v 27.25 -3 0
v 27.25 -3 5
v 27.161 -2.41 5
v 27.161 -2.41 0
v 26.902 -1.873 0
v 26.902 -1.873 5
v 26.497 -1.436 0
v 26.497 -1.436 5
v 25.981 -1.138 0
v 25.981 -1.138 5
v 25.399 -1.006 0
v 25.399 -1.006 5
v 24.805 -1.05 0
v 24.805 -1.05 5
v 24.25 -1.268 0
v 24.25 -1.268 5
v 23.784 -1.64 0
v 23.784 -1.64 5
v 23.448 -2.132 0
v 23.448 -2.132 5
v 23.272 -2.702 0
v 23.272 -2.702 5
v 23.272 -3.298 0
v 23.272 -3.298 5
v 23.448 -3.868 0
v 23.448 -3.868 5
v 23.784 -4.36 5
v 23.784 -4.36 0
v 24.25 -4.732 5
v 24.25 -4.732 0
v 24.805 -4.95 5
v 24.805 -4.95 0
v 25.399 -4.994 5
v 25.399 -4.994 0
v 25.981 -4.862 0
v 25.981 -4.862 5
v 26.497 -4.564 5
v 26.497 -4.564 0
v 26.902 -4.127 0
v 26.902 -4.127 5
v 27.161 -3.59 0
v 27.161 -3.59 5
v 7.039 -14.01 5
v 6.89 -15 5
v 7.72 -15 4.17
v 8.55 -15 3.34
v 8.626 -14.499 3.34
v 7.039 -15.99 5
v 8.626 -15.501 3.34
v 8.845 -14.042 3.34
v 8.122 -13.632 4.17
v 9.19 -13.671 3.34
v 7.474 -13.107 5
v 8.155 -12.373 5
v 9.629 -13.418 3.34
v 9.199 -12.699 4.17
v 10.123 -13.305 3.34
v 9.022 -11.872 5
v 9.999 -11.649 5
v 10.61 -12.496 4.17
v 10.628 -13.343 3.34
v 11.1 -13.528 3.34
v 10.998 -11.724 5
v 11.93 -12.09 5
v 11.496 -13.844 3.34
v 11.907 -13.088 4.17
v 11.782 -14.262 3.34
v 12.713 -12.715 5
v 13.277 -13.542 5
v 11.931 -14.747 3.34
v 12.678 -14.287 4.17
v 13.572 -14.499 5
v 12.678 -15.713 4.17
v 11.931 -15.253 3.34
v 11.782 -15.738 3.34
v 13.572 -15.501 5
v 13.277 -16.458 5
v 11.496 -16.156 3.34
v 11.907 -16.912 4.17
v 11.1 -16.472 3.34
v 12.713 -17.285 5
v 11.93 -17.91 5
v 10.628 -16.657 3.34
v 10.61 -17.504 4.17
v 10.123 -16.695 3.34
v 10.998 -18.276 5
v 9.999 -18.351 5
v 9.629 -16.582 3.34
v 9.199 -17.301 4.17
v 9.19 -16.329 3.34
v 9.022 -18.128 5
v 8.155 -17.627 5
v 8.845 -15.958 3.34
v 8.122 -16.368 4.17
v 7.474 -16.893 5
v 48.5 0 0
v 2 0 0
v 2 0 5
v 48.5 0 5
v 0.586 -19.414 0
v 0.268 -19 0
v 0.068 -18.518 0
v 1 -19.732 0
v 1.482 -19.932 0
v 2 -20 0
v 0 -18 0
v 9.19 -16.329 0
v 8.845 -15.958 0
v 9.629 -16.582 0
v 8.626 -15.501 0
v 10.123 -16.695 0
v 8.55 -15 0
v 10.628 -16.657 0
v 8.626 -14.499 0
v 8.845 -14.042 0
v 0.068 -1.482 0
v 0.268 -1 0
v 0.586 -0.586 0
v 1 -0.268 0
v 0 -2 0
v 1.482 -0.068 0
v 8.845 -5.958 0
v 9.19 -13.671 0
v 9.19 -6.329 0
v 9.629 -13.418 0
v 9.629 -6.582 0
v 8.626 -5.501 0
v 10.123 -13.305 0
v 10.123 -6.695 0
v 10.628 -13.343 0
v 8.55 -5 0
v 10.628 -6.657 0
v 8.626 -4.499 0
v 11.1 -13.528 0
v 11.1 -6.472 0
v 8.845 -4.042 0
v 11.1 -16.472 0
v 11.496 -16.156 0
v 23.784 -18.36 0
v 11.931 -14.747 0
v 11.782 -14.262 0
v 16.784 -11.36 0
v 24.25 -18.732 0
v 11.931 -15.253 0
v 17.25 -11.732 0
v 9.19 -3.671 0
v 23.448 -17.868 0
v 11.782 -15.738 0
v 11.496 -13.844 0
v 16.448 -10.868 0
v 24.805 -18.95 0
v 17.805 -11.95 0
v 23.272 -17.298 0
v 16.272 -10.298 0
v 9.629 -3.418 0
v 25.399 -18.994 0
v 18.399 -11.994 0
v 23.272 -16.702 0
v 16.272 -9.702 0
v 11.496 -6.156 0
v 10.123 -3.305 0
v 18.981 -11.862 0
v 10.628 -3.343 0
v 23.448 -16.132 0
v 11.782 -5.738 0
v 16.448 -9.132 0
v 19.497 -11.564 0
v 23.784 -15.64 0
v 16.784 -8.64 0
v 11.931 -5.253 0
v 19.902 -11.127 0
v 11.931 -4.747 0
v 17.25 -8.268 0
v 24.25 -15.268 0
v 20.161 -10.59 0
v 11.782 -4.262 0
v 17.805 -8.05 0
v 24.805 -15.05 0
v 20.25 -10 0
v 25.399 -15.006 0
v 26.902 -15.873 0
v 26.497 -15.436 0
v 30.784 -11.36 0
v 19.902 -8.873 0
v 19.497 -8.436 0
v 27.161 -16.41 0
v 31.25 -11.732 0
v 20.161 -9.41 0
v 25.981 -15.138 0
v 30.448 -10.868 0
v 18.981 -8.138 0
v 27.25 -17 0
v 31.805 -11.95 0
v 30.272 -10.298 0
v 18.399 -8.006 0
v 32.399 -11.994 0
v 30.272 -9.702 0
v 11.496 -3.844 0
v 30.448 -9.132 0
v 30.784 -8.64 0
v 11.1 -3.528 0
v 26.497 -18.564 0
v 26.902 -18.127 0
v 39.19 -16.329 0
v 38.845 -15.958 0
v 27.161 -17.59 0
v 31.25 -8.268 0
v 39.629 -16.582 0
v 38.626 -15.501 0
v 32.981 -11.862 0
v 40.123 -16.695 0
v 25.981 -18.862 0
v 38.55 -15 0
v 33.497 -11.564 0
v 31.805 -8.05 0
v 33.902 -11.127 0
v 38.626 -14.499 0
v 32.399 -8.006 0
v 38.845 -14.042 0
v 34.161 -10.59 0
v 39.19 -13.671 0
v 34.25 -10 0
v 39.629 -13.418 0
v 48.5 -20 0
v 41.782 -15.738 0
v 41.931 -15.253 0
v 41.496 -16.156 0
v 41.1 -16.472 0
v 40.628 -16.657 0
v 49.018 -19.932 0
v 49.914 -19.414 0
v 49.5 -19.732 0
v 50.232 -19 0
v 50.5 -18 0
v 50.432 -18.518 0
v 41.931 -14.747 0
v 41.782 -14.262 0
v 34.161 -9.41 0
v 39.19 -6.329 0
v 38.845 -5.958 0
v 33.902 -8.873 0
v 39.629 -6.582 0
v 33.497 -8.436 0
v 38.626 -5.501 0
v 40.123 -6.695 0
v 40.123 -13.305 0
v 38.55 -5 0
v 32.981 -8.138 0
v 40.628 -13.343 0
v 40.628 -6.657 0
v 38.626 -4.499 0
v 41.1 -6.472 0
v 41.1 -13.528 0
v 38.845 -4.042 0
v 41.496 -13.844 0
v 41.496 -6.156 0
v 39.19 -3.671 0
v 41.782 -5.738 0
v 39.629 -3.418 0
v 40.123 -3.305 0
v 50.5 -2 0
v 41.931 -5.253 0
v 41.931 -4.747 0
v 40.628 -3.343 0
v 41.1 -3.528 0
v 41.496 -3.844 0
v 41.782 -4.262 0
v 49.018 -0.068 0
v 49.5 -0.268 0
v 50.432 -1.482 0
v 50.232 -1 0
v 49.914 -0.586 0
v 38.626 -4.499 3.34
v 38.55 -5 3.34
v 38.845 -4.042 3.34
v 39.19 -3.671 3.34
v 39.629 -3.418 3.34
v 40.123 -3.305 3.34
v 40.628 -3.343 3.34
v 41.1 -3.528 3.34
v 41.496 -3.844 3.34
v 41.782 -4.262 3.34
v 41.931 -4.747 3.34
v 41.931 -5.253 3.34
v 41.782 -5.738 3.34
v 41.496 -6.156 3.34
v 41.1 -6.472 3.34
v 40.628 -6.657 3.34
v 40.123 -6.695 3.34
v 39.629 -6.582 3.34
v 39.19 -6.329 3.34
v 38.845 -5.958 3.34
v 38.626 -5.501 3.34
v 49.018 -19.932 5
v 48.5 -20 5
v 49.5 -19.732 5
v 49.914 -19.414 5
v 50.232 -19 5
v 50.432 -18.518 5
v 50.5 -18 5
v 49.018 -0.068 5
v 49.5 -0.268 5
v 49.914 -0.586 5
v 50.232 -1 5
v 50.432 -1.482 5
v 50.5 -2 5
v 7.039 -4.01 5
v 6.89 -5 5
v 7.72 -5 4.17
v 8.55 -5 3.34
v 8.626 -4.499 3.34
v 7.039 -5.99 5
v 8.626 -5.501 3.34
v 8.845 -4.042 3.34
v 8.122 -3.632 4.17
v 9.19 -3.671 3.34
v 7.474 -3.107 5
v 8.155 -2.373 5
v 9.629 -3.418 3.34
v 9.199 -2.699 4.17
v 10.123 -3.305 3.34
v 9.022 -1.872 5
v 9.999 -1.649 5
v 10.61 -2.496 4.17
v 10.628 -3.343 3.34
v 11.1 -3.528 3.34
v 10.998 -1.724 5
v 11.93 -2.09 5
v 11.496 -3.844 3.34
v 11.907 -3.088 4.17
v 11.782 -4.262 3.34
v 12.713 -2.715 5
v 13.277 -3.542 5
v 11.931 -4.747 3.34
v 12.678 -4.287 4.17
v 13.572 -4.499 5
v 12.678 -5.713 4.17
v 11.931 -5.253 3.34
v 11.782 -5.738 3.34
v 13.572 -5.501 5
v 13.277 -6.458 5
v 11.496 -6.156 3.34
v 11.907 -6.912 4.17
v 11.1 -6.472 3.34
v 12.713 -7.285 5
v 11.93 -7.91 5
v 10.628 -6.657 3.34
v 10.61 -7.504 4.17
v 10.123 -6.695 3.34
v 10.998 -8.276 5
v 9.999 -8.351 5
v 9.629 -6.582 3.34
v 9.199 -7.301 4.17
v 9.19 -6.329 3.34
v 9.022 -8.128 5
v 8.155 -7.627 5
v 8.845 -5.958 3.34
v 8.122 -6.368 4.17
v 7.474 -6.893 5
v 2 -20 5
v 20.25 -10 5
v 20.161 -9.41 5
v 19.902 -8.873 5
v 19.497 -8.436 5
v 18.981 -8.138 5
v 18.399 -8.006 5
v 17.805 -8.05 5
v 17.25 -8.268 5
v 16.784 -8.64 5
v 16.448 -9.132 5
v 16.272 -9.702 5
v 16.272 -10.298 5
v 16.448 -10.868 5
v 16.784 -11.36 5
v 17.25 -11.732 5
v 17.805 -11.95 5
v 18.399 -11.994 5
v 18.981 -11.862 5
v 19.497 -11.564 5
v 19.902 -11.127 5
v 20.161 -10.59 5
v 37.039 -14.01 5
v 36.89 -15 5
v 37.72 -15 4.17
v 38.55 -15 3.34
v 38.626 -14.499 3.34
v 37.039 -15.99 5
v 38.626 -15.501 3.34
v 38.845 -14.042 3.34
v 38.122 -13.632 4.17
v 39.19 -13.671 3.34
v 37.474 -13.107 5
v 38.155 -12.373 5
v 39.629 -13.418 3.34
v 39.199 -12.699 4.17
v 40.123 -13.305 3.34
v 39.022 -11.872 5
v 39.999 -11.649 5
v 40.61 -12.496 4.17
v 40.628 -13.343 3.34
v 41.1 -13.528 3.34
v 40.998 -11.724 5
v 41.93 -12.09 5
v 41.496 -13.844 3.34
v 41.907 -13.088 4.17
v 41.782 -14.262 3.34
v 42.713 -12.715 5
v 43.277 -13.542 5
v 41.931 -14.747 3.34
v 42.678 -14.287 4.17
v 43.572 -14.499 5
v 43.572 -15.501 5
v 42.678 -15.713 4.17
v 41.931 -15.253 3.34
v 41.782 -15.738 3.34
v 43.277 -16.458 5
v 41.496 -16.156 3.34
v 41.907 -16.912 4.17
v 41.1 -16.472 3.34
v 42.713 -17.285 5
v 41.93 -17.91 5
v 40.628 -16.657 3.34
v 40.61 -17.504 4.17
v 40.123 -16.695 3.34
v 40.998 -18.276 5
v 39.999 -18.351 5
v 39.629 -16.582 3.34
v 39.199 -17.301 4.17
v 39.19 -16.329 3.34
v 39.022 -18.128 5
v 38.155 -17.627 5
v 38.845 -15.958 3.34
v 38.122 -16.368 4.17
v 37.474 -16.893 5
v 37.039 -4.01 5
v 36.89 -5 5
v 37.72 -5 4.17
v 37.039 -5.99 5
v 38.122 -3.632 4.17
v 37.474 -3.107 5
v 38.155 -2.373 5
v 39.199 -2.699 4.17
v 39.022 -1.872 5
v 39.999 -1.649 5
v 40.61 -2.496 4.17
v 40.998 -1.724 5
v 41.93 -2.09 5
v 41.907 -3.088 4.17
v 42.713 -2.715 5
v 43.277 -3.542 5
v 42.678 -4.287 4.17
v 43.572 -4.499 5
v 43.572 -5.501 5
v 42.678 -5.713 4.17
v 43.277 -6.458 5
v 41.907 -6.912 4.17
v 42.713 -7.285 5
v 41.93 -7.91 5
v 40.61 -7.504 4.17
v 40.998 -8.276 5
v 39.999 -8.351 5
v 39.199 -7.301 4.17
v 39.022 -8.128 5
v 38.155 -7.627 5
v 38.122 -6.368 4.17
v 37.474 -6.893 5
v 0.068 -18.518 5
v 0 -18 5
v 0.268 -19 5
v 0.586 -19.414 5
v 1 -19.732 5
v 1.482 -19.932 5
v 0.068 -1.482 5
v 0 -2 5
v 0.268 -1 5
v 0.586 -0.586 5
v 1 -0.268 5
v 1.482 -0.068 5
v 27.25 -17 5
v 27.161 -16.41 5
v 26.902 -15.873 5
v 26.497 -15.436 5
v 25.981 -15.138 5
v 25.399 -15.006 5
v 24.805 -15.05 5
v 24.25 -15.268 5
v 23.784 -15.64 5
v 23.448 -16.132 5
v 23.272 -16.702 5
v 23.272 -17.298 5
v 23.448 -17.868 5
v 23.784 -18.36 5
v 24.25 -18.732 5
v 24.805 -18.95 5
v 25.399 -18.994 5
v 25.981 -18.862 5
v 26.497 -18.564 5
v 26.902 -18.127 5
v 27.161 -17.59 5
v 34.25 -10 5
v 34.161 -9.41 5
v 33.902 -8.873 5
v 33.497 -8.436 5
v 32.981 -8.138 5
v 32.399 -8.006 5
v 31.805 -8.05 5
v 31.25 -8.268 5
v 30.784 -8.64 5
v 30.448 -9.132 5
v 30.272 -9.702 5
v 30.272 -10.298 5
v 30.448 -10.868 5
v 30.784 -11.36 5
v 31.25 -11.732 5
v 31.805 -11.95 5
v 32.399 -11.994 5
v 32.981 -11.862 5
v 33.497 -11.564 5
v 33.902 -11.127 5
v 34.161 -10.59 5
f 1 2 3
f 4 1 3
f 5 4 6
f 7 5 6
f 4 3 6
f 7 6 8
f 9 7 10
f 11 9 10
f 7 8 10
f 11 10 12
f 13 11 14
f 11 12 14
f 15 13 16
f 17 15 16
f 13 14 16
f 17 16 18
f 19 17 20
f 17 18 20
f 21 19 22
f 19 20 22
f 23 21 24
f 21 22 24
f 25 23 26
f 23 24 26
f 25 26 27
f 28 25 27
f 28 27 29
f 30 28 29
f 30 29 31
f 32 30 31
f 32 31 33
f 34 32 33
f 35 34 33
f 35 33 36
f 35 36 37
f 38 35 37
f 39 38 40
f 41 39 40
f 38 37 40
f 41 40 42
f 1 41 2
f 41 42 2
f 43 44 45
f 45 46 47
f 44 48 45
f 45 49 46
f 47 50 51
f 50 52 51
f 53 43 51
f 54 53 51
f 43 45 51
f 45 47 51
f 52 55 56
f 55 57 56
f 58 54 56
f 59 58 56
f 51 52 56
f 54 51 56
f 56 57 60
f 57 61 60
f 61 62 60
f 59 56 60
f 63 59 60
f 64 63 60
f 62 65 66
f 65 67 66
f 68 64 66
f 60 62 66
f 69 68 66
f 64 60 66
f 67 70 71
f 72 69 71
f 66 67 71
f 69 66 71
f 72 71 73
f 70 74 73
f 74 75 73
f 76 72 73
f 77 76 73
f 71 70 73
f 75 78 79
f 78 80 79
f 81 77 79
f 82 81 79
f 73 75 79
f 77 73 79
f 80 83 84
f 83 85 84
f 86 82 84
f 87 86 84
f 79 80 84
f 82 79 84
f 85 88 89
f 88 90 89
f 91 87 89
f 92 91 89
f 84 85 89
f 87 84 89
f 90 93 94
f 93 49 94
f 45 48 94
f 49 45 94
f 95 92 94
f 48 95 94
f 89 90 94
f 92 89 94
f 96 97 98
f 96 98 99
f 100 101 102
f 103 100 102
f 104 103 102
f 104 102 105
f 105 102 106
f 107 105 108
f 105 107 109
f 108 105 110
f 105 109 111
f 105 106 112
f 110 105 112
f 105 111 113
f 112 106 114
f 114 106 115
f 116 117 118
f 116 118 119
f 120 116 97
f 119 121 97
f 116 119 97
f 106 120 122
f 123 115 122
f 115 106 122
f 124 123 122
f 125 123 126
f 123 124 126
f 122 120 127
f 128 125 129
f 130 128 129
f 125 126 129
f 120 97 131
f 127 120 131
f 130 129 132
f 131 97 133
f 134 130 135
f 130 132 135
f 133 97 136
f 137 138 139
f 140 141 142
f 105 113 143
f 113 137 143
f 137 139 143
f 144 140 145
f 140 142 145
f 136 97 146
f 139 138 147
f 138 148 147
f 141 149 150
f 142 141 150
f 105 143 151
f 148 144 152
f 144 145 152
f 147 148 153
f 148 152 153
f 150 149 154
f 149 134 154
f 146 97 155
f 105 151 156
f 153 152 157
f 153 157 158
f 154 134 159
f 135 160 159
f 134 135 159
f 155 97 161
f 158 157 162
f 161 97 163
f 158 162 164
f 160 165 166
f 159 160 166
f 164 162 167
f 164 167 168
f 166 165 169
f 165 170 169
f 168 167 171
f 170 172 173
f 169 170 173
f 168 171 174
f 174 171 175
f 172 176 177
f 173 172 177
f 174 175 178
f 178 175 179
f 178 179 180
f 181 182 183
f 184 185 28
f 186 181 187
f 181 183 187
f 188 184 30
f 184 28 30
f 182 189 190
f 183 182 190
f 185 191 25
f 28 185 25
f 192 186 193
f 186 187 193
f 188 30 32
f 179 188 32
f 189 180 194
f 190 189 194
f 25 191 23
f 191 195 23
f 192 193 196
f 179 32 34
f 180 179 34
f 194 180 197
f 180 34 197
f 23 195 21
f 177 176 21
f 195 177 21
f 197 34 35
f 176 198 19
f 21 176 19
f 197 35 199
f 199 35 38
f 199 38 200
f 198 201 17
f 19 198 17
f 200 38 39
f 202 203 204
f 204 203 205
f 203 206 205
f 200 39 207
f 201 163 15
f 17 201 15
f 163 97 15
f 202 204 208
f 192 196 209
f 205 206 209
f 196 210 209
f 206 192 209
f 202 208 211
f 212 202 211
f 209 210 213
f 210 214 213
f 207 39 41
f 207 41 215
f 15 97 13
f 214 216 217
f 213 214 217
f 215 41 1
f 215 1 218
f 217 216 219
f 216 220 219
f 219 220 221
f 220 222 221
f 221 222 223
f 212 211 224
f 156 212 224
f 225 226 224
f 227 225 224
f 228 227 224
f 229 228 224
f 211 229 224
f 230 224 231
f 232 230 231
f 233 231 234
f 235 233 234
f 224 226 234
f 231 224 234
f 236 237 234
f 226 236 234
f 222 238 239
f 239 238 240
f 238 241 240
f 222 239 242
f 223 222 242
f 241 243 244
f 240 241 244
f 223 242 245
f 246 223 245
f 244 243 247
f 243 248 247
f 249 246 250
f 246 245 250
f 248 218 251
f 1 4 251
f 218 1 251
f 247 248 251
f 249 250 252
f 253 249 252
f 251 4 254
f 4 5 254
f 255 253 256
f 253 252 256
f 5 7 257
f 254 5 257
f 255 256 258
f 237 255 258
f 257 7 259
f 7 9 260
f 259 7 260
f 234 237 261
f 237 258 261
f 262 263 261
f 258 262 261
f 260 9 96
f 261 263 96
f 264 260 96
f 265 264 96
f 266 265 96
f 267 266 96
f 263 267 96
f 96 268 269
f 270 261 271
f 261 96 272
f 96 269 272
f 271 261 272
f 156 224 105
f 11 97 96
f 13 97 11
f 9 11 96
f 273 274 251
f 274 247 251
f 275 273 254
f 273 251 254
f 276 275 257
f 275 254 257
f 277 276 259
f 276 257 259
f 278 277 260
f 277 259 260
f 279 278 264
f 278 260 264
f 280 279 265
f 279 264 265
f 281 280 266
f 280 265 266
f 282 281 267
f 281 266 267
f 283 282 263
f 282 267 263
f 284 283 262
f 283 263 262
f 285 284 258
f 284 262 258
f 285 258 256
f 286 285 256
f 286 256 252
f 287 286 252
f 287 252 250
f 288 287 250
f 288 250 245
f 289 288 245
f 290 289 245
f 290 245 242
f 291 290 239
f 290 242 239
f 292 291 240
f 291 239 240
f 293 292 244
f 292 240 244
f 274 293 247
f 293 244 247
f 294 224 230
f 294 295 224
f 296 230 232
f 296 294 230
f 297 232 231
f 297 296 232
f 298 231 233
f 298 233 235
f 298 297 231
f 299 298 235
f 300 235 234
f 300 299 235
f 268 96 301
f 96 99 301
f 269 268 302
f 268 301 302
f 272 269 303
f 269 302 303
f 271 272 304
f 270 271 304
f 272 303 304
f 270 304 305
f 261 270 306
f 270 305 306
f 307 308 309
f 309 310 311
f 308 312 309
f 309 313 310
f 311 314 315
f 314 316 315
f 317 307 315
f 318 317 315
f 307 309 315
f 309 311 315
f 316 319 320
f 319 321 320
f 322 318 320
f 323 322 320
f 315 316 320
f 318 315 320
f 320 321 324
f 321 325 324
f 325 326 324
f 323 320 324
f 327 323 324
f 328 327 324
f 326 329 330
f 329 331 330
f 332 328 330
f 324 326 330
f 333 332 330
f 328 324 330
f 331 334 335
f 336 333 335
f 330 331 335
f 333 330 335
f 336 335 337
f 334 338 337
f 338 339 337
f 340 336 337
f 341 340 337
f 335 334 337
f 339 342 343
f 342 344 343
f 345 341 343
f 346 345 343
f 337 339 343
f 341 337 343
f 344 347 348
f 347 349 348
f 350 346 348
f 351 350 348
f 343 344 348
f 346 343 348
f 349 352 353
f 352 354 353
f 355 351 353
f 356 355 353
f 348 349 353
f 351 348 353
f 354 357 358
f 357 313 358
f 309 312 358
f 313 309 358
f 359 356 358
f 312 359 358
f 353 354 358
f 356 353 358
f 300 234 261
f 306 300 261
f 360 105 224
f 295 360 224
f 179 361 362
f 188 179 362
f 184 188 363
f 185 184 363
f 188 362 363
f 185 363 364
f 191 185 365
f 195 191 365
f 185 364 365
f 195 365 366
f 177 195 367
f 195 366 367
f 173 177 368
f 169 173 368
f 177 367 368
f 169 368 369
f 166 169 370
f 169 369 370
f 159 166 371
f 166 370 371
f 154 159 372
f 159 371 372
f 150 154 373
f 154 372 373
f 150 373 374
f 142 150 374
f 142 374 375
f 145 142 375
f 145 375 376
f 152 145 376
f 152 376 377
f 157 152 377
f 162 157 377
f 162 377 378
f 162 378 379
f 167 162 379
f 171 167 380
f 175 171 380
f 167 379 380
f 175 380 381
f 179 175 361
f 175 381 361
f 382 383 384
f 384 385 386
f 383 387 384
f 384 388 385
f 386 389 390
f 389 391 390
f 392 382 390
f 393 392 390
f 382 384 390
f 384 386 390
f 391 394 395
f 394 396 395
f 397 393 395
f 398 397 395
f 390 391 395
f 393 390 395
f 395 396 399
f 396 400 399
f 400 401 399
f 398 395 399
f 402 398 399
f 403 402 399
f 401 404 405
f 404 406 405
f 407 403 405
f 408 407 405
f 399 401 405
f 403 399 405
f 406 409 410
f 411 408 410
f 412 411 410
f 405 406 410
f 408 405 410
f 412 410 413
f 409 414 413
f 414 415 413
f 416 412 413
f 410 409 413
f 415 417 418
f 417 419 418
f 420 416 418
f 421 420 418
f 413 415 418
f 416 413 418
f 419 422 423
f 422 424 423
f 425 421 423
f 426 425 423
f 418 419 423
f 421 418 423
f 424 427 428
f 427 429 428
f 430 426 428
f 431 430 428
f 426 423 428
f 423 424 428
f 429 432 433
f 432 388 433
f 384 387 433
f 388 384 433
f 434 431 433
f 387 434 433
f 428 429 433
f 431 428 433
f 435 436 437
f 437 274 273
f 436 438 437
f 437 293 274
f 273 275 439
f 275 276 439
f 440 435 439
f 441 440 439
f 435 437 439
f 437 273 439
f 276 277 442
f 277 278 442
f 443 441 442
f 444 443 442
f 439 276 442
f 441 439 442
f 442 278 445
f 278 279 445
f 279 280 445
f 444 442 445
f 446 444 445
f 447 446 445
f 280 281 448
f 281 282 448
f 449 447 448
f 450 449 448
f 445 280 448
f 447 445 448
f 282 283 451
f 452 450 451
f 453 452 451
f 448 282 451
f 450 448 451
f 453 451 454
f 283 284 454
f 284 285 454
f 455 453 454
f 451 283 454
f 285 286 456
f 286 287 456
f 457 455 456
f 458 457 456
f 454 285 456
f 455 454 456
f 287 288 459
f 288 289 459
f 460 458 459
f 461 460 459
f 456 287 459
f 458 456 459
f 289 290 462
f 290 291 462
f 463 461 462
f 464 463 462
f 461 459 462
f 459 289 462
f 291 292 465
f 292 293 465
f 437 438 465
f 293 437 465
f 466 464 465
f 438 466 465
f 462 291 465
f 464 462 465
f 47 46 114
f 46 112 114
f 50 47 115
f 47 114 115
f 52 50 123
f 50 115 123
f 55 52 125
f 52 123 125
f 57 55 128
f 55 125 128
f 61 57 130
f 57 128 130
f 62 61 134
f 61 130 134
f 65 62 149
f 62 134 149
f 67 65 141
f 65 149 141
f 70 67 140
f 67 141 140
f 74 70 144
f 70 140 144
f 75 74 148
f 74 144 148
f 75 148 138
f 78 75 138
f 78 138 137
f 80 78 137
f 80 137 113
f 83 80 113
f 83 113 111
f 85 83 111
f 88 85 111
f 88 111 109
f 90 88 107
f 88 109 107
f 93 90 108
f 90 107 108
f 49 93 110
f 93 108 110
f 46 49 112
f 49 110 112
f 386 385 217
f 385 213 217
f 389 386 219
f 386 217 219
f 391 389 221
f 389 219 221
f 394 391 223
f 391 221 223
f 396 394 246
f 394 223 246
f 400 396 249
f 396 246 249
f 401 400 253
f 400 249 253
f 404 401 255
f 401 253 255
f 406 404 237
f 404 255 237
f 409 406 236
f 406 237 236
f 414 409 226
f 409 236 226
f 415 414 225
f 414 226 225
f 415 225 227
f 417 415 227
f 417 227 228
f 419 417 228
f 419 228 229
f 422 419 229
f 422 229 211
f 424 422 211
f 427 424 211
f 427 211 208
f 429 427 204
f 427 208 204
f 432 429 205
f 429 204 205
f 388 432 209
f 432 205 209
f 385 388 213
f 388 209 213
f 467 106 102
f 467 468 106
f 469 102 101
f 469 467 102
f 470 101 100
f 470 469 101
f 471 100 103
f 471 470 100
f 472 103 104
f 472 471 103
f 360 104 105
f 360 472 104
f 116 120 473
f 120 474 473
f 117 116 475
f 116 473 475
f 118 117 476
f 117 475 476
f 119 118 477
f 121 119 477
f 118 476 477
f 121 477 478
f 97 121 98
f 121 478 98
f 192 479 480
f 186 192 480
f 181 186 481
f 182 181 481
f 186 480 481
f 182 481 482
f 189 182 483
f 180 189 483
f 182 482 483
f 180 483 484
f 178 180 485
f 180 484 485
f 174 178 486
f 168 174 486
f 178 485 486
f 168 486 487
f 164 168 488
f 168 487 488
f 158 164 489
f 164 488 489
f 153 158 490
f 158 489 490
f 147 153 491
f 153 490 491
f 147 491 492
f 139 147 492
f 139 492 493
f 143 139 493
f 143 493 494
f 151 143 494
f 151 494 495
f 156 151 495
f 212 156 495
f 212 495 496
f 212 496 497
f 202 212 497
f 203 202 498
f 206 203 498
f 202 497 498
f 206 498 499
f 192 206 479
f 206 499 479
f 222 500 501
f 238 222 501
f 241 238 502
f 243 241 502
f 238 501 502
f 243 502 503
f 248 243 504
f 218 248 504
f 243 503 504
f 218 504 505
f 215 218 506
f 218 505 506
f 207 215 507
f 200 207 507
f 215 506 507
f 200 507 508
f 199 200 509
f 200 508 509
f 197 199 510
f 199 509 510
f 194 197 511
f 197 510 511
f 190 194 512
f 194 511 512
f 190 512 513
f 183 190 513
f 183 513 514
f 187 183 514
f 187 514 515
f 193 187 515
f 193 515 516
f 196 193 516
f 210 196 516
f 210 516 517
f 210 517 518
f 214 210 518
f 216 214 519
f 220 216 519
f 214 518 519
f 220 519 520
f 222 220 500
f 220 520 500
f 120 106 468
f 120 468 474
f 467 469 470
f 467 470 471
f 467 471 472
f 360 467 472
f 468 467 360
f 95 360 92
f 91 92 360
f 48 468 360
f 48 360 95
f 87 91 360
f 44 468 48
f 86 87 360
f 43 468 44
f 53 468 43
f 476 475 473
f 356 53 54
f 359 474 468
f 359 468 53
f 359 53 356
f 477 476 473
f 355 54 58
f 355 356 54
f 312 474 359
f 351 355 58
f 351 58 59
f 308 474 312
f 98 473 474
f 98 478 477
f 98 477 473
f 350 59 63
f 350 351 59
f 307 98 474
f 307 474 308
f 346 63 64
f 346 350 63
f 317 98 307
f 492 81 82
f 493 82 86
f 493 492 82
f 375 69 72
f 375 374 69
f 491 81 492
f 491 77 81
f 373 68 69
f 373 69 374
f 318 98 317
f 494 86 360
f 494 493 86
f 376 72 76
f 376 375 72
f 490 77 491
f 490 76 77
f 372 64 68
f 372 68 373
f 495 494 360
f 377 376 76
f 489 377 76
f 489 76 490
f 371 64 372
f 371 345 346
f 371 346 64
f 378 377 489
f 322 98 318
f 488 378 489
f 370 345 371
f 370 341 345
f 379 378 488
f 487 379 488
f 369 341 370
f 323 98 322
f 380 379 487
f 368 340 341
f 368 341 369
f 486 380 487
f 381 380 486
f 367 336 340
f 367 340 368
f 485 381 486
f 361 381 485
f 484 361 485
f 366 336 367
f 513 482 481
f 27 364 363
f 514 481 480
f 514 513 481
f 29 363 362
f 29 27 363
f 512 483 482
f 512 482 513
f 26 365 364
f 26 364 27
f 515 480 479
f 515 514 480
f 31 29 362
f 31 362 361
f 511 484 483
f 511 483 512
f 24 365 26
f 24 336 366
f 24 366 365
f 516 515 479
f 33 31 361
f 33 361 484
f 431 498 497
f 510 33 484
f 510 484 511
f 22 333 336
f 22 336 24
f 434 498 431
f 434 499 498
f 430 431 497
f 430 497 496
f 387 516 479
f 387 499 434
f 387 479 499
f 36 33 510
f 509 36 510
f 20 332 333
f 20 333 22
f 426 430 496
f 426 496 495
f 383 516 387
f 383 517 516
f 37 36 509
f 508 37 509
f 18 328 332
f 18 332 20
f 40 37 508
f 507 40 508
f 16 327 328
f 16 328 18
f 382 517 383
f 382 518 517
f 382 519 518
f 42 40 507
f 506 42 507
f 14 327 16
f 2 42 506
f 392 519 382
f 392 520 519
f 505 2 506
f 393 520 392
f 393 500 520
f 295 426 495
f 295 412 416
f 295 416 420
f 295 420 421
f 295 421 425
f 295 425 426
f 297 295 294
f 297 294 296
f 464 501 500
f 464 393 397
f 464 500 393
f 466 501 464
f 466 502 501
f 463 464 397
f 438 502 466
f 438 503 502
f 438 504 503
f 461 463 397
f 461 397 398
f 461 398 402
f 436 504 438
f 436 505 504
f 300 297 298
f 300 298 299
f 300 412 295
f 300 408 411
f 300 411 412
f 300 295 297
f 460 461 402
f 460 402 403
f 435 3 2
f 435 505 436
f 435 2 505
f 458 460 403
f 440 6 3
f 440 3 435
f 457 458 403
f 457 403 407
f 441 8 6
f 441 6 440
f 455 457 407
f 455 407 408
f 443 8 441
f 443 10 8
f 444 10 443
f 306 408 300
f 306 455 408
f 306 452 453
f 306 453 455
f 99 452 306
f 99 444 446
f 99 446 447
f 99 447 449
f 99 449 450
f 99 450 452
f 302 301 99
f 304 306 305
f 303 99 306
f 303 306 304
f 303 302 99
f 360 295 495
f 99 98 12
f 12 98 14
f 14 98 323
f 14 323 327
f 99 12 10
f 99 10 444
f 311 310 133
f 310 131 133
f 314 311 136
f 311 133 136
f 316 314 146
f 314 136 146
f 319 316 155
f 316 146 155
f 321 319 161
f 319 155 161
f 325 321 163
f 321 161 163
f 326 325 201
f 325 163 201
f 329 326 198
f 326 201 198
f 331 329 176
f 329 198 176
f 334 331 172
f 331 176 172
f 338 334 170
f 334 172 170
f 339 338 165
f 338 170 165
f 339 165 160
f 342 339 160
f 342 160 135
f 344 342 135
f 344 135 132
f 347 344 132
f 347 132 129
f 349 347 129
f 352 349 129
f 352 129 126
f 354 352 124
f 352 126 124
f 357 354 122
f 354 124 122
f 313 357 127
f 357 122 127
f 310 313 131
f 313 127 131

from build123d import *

# Parameters (mm, degrees)
SKETCH_1_W                   = 50.5
SKETCH_1_H                   = 20
EXTRUDE_1_DEPTH              = 5
SKETCH_2_R                   = 1.6
CUT_EXTRUDE_1_DEPTH          = 5
HOLE_WIZARD_M3_1_D           = 3.4
HOLE_WIZARD_M3_1_CSINK_D     = 6.72
HOLE_WIZARD_M3_1_CSINK_ANGLE = 90
SKETCH_6_R                   = 2
CUT_EXTRUDE_2_DEPTH          = 5
FILLET_1_R                   = 2


with BuildPart() as part:
    # 草图1 → 凸台-拉伸1 (new body)
    with BuildSketch(Plane.XY):
        with Locations((25.25, -10)):
            Rectangle(SKETCH_1_W, SKETCH_1_H)
    extrude(amount=EXTRUDE_1_DEPTH)

    # 草图2 → 切除-拉伸1 (cut)
    with BuildSketch(Plane(origin=(0, 0, 0), x_dir=(-1, 0, 0), z_dir=(0, 0, -1))):
        with Locations((-40.25, -5)):
            Circle(SKETCH_2_R)
        with Locations((-40.25, -15)):
            Circle(SKETCH_2_R)
        with Locations((-10.25, -5)):
            Circle(SKETCH_2_R)
        with Locations((-10.25, -15)):
            Circle(SKETCH_2_R)
    extrude(amount=-CUT_EXTRUDE_1_DEPTH, mode=Mode.SUBTRACT)

    # M3 六角凹锥坑螺钉的锥形沉头孔1 (through all)
    with Locations(Plane.XY.offset(5)):
        with Locations((10.25, -5), (10.25, -15), (40.25, -5), (40.25, -15)):
            CounterSinkHole(HOLE_WIZARD_M3_1_D / 2, HOLE_WIZARD_M3_1_CSINK_D / 2, counter_sink_angle=HOLE_WIZARD_M3_1_CSINK_ANGLE)

    # 草图6 → 切除-拉伸2 (cut)
    with BuildSketch(Plane.XY.offset(5)):
        with Locations((25.25, -3)):
            Circle(SKETCH_6_R)
        with Locations((32.25, -10)):
            Circle(SKETCH_6_R)
        with Locations((18.25, -10)):
            Circle(SKETCH_6_R)
        with Locations((25.25, -17)):
            Circle(SKETCH_6_R)
    extrude(amount=-CUT_EXTRUDE_2_DEPTH, mode=Mode.SUBTRACT)

    # 圆角1
    fillet_1_edges = [part.edges().sort_by_distance(p)[0] for p in [
        (0, 0, 2.5),
        (50.5, 0, 2.5),
        (50.5, -20, 2.5),
        (0, -20, 2.5),
    ]]
    fillet(fillet_1_edges, radius=FILLET_1_R)


solid = part.part
